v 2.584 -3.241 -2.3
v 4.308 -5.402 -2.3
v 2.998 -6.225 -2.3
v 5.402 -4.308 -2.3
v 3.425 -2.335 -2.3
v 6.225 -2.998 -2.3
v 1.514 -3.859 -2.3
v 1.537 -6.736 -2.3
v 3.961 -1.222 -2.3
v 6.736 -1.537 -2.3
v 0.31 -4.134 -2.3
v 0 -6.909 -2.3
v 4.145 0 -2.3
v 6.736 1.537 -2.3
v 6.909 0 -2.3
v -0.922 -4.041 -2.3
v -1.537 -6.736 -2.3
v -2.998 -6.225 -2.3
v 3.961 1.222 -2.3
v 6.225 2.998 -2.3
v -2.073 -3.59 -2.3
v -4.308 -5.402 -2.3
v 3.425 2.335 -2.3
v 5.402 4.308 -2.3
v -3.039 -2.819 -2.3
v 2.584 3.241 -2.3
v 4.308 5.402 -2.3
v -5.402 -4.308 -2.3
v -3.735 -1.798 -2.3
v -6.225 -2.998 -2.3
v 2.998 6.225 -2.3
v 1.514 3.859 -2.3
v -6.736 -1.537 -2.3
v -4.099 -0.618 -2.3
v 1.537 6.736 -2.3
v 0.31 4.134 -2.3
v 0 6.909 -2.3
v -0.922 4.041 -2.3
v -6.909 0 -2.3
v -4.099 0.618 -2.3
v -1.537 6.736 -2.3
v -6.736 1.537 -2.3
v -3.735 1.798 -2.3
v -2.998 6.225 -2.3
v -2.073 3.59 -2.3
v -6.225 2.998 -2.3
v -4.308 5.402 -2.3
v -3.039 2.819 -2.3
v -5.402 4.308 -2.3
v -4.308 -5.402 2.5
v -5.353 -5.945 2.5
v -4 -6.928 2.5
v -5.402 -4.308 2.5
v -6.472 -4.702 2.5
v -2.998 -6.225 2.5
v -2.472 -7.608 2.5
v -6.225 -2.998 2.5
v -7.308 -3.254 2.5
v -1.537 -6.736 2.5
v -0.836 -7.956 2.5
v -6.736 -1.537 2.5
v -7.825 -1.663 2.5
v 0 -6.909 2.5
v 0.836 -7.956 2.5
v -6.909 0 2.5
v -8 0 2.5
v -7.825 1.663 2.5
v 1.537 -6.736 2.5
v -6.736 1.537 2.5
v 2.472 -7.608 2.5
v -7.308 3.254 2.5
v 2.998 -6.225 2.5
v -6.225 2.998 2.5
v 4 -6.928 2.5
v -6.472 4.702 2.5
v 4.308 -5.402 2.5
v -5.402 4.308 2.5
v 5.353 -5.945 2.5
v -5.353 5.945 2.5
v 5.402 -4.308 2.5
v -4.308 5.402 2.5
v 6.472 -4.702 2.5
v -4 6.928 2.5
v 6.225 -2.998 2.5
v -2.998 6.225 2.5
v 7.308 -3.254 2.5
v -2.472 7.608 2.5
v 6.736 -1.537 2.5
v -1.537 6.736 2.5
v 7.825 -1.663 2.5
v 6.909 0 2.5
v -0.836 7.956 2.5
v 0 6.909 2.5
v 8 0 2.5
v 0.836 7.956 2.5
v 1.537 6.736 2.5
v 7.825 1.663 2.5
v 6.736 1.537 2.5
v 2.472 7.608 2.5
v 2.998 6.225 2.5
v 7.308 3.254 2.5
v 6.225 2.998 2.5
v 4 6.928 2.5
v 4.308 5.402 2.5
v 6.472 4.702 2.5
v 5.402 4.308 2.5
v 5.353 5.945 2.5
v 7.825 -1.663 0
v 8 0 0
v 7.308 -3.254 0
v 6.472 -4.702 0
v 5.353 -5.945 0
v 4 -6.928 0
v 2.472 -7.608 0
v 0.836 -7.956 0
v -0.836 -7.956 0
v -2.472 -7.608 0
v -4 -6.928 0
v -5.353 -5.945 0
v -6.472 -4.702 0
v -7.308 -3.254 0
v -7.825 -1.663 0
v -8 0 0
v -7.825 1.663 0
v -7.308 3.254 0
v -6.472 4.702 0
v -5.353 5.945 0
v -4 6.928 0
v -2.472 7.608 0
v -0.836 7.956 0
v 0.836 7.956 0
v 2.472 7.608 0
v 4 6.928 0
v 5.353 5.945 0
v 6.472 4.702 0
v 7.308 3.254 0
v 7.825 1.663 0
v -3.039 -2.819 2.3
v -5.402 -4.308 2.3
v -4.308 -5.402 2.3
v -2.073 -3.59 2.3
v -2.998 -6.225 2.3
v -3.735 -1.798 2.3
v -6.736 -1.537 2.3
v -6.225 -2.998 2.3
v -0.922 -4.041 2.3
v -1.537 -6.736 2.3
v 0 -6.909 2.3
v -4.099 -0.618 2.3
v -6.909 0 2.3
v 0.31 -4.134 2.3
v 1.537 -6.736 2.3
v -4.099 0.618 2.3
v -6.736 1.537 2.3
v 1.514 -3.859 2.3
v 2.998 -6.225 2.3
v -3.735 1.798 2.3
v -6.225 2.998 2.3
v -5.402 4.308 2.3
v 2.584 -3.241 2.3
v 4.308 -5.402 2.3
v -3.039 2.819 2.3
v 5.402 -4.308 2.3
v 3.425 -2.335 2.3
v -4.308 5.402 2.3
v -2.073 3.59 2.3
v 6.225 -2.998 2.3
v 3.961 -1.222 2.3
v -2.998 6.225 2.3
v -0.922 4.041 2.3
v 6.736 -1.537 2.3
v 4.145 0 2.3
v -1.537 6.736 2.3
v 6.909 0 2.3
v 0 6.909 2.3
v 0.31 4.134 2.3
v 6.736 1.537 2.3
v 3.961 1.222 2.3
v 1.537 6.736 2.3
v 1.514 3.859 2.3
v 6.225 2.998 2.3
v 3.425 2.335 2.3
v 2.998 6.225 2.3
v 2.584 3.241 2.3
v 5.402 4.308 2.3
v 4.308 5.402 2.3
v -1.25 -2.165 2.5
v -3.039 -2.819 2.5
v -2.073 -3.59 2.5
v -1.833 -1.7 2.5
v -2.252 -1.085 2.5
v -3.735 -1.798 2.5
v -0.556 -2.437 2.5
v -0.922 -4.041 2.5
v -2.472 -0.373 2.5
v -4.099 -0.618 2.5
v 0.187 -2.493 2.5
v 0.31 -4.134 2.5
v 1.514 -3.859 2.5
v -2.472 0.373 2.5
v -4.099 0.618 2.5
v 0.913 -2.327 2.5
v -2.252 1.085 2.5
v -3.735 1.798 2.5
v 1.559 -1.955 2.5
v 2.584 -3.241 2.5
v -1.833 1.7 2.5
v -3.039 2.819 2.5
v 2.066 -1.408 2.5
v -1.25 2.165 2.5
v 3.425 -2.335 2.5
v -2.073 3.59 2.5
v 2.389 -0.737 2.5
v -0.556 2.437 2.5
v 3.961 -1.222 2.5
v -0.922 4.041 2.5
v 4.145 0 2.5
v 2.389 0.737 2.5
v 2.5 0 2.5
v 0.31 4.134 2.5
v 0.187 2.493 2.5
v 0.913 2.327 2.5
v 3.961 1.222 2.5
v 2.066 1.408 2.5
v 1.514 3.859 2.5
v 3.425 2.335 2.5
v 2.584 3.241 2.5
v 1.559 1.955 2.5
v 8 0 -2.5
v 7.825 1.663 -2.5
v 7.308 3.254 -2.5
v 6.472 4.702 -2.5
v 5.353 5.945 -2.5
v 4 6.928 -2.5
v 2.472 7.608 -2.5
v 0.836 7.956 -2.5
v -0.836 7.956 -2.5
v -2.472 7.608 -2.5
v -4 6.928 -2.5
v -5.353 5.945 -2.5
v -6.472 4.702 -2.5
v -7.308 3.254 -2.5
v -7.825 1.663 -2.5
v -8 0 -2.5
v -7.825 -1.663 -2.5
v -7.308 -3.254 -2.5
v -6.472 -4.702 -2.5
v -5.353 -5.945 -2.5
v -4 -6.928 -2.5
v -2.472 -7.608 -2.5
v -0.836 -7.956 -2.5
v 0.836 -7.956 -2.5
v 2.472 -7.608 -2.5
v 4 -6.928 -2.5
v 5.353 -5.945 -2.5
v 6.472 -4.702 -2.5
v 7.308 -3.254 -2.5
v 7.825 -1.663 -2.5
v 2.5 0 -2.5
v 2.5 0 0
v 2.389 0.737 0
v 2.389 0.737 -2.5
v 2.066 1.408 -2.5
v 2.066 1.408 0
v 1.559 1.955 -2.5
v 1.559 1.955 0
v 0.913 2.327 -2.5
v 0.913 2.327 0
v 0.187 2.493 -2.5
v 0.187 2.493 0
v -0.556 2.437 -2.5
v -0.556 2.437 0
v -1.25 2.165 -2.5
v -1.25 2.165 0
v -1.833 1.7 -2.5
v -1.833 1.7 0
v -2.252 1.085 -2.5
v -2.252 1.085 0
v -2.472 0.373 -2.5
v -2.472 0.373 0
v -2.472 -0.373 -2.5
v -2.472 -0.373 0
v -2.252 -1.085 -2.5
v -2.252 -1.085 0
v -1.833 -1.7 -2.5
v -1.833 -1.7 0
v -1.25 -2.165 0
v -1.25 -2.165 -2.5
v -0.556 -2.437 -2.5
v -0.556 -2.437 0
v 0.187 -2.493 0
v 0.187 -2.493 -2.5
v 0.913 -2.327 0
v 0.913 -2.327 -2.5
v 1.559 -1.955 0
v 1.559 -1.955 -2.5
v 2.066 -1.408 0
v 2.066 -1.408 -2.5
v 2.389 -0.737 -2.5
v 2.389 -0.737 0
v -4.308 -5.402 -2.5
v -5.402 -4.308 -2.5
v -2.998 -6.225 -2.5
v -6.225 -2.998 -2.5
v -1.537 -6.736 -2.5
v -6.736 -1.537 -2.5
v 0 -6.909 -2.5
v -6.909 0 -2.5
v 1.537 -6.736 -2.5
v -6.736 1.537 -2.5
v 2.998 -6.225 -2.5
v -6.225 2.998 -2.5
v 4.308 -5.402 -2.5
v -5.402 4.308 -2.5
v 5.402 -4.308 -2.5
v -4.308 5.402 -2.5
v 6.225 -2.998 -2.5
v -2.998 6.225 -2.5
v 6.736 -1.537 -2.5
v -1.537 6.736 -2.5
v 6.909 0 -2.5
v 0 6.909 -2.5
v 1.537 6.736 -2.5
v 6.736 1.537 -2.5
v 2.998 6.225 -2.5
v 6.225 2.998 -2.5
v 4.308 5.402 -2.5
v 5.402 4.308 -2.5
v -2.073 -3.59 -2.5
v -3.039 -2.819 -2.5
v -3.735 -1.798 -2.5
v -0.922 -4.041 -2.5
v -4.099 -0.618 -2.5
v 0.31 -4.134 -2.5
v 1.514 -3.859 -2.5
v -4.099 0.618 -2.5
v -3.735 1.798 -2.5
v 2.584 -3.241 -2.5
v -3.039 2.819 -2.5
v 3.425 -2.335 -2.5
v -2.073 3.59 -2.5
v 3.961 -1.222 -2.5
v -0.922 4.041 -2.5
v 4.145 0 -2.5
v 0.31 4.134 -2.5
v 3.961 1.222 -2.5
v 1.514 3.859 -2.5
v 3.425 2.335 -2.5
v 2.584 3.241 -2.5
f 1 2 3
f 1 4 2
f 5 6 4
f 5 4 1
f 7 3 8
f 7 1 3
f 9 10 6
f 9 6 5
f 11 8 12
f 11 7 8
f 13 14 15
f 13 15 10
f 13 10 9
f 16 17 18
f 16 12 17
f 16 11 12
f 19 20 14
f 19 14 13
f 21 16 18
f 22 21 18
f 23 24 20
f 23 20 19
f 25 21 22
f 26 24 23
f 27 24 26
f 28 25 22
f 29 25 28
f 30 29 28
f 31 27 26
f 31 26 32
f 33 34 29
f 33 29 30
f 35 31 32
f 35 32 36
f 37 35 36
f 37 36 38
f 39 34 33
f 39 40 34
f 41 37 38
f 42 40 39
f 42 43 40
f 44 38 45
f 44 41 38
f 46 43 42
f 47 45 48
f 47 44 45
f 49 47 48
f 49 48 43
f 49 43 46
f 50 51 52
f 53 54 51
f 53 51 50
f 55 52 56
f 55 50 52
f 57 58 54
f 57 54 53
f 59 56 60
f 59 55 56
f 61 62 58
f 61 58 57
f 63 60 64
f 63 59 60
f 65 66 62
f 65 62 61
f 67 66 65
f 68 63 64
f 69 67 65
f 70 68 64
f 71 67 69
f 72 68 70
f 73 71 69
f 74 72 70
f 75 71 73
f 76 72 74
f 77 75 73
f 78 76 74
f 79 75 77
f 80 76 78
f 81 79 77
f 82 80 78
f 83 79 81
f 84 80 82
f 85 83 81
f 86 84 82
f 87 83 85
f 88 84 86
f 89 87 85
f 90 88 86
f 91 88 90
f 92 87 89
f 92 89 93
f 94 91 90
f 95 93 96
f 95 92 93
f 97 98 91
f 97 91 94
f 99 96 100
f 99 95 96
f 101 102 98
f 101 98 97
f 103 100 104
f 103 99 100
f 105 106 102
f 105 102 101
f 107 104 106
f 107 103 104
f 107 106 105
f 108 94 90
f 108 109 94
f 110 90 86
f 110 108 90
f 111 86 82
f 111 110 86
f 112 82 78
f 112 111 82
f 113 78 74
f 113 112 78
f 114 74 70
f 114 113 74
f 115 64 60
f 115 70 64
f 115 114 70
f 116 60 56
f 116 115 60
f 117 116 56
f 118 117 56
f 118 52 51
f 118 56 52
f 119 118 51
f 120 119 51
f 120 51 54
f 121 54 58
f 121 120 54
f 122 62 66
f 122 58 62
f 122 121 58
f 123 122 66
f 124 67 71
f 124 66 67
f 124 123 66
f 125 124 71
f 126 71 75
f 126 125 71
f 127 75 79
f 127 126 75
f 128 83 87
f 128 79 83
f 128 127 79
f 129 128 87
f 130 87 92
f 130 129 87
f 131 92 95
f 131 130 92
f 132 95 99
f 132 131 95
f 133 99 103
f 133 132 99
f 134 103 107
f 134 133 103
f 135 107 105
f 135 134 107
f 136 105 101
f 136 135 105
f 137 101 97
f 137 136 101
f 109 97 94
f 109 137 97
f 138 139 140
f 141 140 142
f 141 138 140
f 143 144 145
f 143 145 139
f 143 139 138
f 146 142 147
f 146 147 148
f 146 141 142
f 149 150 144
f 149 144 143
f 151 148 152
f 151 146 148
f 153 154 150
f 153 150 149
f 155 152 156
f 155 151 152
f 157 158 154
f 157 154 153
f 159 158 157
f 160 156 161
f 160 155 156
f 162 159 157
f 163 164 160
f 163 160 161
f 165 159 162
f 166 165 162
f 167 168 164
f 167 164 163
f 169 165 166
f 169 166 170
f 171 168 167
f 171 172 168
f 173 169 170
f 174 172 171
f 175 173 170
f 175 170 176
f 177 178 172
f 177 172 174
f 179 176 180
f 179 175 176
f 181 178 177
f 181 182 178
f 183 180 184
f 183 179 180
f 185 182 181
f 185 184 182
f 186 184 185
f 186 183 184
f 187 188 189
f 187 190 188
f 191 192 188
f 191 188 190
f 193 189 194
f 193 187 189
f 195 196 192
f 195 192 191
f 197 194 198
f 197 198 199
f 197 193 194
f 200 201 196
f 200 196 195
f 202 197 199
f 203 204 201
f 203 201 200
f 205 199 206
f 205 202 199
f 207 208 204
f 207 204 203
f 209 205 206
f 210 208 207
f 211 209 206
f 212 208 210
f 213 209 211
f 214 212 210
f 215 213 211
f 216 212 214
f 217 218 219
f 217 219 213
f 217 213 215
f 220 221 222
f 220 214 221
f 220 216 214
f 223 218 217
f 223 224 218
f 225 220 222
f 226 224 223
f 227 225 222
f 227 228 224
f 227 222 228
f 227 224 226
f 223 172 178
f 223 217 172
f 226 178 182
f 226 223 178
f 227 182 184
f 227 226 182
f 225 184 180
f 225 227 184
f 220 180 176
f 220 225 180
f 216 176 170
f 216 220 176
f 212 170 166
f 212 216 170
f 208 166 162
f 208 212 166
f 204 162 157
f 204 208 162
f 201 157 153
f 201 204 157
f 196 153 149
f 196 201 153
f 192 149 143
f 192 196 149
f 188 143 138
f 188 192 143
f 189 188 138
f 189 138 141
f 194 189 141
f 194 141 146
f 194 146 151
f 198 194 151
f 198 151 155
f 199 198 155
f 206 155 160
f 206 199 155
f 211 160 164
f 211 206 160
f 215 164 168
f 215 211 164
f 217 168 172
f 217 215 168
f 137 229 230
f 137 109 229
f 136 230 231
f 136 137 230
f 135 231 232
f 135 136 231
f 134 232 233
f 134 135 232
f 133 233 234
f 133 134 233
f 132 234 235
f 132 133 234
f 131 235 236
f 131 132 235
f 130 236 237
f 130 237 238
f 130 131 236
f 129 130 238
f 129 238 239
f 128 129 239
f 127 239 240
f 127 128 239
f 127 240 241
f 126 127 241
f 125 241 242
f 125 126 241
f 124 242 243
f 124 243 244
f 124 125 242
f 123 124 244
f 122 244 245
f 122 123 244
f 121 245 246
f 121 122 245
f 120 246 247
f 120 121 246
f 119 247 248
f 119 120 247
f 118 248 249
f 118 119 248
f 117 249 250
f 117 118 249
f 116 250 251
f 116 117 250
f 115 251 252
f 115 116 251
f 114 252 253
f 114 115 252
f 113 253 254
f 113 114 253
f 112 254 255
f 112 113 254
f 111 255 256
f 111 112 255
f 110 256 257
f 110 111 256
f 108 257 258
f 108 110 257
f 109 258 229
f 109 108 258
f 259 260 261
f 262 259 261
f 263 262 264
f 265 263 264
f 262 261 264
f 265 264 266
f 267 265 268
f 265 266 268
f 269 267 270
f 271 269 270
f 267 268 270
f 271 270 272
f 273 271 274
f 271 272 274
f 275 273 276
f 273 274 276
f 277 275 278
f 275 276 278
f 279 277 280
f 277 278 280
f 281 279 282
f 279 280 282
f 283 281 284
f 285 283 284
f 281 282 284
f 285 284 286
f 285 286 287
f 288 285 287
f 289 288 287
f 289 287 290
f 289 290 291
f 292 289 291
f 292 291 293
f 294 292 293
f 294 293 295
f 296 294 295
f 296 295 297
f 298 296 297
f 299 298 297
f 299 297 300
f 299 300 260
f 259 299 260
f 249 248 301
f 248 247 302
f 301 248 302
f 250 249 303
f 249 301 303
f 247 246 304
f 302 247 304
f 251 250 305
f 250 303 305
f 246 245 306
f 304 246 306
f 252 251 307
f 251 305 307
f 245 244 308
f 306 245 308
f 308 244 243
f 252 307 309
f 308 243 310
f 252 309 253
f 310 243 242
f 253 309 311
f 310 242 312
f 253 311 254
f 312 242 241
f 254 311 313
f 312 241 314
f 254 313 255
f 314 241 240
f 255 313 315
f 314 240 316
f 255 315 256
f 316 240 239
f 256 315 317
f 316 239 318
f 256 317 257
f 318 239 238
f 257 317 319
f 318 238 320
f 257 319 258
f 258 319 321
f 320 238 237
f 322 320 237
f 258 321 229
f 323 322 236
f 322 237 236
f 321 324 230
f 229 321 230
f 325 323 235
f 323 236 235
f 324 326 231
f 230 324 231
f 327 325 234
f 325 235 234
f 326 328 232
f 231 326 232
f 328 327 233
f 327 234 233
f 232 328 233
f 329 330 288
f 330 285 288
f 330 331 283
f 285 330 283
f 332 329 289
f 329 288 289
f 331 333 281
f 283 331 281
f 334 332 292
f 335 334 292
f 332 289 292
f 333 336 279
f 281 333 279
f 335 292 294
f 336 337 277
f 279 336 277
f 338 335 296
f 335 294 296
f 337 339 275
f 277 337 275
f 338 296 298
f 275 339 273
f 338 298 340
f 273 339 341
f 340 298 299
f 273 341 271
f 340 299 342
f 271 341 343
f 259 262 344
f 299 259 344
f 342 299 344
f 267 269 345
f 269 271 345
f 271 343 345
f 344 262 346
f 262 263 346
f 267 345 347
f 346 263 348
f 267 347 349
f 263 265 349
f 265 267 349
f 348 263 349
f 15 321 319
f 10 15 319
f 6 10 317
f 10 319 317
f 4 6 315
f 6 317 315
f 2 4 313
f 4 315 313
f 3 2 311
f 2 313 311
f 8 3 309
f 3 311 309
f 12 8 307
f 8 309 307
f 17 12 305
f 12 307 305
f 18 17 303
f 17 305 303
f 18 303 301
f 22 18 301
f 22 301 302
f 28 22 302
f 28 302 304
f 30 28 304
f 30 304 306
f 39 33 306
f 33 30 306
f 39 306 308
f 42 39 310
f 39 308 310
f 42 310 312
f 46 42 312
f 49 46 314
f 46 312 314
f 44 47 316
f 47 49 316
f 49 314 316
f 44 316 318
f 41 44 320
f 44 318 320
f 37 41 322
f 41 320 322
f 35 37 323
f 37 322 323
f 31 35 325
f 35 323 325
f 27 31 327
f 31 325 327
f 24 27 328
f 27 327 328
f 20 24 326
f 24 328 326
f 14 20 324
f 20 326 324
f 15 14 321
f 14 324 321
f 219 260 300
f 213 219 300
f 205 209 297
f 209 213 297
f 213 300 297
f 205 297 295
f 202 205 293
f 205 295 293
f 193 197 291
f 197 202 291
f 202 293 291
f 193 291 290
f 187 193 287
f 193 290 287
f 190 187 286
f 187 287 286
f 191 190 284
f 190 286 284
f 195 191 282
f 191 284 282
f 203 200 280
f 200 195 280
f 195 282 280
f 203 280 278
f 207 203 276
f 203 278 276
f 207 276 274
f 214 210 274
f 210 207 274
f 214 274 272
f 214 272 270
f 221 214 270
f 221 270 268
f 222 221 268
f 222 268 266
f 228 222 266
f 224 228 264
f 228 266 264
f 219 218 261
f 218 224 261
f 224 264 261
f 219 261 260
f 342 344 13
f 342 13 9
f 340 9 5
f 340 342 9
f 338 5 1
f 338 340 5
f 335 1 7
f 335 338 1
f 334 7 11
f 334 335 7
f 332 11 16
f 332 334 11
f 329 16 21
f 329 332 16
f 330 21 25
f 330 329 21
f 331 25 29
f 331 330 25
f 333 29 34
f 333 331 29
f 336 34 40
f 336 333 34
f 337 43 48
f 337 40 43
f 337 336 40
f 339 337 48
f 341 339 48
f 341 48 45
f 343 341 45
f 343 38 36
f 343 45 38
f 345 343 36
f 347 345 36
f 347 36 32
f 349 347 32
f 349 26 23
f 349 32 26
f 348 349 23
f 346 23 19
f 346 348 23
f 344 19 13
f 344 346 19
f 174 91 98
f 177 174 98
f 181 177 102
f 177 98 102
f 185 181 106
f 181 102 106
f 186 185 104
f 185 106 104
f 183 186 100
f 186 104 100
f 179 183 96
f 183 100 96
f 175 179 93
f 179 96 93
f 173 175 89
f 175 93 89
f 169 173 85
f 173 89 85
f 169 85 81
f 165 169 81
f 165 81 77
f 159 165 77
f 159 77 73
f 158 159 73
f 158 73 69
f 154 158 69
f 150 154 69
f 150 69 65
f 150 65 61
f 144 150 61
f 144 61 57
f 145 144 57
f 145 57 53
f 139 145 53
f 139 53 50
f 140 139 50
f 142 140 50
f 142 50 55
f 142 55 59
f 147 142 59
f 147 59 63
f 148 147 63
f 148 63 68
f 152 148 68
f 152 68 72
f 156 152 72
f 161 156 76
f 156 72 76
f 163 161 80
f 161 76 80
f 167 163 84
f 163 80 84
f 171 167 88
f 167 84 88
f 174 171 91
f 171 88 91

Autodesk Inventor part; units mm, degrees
ref_plane "YZ Plane" through (0, 0, 0) normal (1, 0, 0) x (0, 1, 0)
ref_plane "XZ Plane" through (0, 0, 0) normal (0, 1, 0) x (-1, 0, 0)
ref_plane "XY Plane" through (0, 0, 0) normal (0, 0, 1) x (1, 0, 0)
sketch "Sketch1" plane through (0, 0, 0) normal (0, 0, 1) x (1, 0, 0)
  circle A0 centre (0, 0) radius 8
  circle A1 centre (0, 0) radius 2.5
  dimension "d0" = 16
  dimension "d1" = 5
extrude "Extrusion1" add sketch "Sketch1" along normal mid plane 5
sketch "Sketch2" plane through (0, 0, 2.5) normal (0, 0, 1) x (1, 0, 0)
  circle A0 centre (0, 0) radius 4.1451
  circle A1 centre (0, 0) radius 6.9091
extrude "Extrusion2" cut sketch "Sketch2" against normal blind 0.2
mirror "Mirror1" about plane through (0, 0, 0) normal (0, 0, 1) of "Extrusion2"
properties part number "625 Bearing"
